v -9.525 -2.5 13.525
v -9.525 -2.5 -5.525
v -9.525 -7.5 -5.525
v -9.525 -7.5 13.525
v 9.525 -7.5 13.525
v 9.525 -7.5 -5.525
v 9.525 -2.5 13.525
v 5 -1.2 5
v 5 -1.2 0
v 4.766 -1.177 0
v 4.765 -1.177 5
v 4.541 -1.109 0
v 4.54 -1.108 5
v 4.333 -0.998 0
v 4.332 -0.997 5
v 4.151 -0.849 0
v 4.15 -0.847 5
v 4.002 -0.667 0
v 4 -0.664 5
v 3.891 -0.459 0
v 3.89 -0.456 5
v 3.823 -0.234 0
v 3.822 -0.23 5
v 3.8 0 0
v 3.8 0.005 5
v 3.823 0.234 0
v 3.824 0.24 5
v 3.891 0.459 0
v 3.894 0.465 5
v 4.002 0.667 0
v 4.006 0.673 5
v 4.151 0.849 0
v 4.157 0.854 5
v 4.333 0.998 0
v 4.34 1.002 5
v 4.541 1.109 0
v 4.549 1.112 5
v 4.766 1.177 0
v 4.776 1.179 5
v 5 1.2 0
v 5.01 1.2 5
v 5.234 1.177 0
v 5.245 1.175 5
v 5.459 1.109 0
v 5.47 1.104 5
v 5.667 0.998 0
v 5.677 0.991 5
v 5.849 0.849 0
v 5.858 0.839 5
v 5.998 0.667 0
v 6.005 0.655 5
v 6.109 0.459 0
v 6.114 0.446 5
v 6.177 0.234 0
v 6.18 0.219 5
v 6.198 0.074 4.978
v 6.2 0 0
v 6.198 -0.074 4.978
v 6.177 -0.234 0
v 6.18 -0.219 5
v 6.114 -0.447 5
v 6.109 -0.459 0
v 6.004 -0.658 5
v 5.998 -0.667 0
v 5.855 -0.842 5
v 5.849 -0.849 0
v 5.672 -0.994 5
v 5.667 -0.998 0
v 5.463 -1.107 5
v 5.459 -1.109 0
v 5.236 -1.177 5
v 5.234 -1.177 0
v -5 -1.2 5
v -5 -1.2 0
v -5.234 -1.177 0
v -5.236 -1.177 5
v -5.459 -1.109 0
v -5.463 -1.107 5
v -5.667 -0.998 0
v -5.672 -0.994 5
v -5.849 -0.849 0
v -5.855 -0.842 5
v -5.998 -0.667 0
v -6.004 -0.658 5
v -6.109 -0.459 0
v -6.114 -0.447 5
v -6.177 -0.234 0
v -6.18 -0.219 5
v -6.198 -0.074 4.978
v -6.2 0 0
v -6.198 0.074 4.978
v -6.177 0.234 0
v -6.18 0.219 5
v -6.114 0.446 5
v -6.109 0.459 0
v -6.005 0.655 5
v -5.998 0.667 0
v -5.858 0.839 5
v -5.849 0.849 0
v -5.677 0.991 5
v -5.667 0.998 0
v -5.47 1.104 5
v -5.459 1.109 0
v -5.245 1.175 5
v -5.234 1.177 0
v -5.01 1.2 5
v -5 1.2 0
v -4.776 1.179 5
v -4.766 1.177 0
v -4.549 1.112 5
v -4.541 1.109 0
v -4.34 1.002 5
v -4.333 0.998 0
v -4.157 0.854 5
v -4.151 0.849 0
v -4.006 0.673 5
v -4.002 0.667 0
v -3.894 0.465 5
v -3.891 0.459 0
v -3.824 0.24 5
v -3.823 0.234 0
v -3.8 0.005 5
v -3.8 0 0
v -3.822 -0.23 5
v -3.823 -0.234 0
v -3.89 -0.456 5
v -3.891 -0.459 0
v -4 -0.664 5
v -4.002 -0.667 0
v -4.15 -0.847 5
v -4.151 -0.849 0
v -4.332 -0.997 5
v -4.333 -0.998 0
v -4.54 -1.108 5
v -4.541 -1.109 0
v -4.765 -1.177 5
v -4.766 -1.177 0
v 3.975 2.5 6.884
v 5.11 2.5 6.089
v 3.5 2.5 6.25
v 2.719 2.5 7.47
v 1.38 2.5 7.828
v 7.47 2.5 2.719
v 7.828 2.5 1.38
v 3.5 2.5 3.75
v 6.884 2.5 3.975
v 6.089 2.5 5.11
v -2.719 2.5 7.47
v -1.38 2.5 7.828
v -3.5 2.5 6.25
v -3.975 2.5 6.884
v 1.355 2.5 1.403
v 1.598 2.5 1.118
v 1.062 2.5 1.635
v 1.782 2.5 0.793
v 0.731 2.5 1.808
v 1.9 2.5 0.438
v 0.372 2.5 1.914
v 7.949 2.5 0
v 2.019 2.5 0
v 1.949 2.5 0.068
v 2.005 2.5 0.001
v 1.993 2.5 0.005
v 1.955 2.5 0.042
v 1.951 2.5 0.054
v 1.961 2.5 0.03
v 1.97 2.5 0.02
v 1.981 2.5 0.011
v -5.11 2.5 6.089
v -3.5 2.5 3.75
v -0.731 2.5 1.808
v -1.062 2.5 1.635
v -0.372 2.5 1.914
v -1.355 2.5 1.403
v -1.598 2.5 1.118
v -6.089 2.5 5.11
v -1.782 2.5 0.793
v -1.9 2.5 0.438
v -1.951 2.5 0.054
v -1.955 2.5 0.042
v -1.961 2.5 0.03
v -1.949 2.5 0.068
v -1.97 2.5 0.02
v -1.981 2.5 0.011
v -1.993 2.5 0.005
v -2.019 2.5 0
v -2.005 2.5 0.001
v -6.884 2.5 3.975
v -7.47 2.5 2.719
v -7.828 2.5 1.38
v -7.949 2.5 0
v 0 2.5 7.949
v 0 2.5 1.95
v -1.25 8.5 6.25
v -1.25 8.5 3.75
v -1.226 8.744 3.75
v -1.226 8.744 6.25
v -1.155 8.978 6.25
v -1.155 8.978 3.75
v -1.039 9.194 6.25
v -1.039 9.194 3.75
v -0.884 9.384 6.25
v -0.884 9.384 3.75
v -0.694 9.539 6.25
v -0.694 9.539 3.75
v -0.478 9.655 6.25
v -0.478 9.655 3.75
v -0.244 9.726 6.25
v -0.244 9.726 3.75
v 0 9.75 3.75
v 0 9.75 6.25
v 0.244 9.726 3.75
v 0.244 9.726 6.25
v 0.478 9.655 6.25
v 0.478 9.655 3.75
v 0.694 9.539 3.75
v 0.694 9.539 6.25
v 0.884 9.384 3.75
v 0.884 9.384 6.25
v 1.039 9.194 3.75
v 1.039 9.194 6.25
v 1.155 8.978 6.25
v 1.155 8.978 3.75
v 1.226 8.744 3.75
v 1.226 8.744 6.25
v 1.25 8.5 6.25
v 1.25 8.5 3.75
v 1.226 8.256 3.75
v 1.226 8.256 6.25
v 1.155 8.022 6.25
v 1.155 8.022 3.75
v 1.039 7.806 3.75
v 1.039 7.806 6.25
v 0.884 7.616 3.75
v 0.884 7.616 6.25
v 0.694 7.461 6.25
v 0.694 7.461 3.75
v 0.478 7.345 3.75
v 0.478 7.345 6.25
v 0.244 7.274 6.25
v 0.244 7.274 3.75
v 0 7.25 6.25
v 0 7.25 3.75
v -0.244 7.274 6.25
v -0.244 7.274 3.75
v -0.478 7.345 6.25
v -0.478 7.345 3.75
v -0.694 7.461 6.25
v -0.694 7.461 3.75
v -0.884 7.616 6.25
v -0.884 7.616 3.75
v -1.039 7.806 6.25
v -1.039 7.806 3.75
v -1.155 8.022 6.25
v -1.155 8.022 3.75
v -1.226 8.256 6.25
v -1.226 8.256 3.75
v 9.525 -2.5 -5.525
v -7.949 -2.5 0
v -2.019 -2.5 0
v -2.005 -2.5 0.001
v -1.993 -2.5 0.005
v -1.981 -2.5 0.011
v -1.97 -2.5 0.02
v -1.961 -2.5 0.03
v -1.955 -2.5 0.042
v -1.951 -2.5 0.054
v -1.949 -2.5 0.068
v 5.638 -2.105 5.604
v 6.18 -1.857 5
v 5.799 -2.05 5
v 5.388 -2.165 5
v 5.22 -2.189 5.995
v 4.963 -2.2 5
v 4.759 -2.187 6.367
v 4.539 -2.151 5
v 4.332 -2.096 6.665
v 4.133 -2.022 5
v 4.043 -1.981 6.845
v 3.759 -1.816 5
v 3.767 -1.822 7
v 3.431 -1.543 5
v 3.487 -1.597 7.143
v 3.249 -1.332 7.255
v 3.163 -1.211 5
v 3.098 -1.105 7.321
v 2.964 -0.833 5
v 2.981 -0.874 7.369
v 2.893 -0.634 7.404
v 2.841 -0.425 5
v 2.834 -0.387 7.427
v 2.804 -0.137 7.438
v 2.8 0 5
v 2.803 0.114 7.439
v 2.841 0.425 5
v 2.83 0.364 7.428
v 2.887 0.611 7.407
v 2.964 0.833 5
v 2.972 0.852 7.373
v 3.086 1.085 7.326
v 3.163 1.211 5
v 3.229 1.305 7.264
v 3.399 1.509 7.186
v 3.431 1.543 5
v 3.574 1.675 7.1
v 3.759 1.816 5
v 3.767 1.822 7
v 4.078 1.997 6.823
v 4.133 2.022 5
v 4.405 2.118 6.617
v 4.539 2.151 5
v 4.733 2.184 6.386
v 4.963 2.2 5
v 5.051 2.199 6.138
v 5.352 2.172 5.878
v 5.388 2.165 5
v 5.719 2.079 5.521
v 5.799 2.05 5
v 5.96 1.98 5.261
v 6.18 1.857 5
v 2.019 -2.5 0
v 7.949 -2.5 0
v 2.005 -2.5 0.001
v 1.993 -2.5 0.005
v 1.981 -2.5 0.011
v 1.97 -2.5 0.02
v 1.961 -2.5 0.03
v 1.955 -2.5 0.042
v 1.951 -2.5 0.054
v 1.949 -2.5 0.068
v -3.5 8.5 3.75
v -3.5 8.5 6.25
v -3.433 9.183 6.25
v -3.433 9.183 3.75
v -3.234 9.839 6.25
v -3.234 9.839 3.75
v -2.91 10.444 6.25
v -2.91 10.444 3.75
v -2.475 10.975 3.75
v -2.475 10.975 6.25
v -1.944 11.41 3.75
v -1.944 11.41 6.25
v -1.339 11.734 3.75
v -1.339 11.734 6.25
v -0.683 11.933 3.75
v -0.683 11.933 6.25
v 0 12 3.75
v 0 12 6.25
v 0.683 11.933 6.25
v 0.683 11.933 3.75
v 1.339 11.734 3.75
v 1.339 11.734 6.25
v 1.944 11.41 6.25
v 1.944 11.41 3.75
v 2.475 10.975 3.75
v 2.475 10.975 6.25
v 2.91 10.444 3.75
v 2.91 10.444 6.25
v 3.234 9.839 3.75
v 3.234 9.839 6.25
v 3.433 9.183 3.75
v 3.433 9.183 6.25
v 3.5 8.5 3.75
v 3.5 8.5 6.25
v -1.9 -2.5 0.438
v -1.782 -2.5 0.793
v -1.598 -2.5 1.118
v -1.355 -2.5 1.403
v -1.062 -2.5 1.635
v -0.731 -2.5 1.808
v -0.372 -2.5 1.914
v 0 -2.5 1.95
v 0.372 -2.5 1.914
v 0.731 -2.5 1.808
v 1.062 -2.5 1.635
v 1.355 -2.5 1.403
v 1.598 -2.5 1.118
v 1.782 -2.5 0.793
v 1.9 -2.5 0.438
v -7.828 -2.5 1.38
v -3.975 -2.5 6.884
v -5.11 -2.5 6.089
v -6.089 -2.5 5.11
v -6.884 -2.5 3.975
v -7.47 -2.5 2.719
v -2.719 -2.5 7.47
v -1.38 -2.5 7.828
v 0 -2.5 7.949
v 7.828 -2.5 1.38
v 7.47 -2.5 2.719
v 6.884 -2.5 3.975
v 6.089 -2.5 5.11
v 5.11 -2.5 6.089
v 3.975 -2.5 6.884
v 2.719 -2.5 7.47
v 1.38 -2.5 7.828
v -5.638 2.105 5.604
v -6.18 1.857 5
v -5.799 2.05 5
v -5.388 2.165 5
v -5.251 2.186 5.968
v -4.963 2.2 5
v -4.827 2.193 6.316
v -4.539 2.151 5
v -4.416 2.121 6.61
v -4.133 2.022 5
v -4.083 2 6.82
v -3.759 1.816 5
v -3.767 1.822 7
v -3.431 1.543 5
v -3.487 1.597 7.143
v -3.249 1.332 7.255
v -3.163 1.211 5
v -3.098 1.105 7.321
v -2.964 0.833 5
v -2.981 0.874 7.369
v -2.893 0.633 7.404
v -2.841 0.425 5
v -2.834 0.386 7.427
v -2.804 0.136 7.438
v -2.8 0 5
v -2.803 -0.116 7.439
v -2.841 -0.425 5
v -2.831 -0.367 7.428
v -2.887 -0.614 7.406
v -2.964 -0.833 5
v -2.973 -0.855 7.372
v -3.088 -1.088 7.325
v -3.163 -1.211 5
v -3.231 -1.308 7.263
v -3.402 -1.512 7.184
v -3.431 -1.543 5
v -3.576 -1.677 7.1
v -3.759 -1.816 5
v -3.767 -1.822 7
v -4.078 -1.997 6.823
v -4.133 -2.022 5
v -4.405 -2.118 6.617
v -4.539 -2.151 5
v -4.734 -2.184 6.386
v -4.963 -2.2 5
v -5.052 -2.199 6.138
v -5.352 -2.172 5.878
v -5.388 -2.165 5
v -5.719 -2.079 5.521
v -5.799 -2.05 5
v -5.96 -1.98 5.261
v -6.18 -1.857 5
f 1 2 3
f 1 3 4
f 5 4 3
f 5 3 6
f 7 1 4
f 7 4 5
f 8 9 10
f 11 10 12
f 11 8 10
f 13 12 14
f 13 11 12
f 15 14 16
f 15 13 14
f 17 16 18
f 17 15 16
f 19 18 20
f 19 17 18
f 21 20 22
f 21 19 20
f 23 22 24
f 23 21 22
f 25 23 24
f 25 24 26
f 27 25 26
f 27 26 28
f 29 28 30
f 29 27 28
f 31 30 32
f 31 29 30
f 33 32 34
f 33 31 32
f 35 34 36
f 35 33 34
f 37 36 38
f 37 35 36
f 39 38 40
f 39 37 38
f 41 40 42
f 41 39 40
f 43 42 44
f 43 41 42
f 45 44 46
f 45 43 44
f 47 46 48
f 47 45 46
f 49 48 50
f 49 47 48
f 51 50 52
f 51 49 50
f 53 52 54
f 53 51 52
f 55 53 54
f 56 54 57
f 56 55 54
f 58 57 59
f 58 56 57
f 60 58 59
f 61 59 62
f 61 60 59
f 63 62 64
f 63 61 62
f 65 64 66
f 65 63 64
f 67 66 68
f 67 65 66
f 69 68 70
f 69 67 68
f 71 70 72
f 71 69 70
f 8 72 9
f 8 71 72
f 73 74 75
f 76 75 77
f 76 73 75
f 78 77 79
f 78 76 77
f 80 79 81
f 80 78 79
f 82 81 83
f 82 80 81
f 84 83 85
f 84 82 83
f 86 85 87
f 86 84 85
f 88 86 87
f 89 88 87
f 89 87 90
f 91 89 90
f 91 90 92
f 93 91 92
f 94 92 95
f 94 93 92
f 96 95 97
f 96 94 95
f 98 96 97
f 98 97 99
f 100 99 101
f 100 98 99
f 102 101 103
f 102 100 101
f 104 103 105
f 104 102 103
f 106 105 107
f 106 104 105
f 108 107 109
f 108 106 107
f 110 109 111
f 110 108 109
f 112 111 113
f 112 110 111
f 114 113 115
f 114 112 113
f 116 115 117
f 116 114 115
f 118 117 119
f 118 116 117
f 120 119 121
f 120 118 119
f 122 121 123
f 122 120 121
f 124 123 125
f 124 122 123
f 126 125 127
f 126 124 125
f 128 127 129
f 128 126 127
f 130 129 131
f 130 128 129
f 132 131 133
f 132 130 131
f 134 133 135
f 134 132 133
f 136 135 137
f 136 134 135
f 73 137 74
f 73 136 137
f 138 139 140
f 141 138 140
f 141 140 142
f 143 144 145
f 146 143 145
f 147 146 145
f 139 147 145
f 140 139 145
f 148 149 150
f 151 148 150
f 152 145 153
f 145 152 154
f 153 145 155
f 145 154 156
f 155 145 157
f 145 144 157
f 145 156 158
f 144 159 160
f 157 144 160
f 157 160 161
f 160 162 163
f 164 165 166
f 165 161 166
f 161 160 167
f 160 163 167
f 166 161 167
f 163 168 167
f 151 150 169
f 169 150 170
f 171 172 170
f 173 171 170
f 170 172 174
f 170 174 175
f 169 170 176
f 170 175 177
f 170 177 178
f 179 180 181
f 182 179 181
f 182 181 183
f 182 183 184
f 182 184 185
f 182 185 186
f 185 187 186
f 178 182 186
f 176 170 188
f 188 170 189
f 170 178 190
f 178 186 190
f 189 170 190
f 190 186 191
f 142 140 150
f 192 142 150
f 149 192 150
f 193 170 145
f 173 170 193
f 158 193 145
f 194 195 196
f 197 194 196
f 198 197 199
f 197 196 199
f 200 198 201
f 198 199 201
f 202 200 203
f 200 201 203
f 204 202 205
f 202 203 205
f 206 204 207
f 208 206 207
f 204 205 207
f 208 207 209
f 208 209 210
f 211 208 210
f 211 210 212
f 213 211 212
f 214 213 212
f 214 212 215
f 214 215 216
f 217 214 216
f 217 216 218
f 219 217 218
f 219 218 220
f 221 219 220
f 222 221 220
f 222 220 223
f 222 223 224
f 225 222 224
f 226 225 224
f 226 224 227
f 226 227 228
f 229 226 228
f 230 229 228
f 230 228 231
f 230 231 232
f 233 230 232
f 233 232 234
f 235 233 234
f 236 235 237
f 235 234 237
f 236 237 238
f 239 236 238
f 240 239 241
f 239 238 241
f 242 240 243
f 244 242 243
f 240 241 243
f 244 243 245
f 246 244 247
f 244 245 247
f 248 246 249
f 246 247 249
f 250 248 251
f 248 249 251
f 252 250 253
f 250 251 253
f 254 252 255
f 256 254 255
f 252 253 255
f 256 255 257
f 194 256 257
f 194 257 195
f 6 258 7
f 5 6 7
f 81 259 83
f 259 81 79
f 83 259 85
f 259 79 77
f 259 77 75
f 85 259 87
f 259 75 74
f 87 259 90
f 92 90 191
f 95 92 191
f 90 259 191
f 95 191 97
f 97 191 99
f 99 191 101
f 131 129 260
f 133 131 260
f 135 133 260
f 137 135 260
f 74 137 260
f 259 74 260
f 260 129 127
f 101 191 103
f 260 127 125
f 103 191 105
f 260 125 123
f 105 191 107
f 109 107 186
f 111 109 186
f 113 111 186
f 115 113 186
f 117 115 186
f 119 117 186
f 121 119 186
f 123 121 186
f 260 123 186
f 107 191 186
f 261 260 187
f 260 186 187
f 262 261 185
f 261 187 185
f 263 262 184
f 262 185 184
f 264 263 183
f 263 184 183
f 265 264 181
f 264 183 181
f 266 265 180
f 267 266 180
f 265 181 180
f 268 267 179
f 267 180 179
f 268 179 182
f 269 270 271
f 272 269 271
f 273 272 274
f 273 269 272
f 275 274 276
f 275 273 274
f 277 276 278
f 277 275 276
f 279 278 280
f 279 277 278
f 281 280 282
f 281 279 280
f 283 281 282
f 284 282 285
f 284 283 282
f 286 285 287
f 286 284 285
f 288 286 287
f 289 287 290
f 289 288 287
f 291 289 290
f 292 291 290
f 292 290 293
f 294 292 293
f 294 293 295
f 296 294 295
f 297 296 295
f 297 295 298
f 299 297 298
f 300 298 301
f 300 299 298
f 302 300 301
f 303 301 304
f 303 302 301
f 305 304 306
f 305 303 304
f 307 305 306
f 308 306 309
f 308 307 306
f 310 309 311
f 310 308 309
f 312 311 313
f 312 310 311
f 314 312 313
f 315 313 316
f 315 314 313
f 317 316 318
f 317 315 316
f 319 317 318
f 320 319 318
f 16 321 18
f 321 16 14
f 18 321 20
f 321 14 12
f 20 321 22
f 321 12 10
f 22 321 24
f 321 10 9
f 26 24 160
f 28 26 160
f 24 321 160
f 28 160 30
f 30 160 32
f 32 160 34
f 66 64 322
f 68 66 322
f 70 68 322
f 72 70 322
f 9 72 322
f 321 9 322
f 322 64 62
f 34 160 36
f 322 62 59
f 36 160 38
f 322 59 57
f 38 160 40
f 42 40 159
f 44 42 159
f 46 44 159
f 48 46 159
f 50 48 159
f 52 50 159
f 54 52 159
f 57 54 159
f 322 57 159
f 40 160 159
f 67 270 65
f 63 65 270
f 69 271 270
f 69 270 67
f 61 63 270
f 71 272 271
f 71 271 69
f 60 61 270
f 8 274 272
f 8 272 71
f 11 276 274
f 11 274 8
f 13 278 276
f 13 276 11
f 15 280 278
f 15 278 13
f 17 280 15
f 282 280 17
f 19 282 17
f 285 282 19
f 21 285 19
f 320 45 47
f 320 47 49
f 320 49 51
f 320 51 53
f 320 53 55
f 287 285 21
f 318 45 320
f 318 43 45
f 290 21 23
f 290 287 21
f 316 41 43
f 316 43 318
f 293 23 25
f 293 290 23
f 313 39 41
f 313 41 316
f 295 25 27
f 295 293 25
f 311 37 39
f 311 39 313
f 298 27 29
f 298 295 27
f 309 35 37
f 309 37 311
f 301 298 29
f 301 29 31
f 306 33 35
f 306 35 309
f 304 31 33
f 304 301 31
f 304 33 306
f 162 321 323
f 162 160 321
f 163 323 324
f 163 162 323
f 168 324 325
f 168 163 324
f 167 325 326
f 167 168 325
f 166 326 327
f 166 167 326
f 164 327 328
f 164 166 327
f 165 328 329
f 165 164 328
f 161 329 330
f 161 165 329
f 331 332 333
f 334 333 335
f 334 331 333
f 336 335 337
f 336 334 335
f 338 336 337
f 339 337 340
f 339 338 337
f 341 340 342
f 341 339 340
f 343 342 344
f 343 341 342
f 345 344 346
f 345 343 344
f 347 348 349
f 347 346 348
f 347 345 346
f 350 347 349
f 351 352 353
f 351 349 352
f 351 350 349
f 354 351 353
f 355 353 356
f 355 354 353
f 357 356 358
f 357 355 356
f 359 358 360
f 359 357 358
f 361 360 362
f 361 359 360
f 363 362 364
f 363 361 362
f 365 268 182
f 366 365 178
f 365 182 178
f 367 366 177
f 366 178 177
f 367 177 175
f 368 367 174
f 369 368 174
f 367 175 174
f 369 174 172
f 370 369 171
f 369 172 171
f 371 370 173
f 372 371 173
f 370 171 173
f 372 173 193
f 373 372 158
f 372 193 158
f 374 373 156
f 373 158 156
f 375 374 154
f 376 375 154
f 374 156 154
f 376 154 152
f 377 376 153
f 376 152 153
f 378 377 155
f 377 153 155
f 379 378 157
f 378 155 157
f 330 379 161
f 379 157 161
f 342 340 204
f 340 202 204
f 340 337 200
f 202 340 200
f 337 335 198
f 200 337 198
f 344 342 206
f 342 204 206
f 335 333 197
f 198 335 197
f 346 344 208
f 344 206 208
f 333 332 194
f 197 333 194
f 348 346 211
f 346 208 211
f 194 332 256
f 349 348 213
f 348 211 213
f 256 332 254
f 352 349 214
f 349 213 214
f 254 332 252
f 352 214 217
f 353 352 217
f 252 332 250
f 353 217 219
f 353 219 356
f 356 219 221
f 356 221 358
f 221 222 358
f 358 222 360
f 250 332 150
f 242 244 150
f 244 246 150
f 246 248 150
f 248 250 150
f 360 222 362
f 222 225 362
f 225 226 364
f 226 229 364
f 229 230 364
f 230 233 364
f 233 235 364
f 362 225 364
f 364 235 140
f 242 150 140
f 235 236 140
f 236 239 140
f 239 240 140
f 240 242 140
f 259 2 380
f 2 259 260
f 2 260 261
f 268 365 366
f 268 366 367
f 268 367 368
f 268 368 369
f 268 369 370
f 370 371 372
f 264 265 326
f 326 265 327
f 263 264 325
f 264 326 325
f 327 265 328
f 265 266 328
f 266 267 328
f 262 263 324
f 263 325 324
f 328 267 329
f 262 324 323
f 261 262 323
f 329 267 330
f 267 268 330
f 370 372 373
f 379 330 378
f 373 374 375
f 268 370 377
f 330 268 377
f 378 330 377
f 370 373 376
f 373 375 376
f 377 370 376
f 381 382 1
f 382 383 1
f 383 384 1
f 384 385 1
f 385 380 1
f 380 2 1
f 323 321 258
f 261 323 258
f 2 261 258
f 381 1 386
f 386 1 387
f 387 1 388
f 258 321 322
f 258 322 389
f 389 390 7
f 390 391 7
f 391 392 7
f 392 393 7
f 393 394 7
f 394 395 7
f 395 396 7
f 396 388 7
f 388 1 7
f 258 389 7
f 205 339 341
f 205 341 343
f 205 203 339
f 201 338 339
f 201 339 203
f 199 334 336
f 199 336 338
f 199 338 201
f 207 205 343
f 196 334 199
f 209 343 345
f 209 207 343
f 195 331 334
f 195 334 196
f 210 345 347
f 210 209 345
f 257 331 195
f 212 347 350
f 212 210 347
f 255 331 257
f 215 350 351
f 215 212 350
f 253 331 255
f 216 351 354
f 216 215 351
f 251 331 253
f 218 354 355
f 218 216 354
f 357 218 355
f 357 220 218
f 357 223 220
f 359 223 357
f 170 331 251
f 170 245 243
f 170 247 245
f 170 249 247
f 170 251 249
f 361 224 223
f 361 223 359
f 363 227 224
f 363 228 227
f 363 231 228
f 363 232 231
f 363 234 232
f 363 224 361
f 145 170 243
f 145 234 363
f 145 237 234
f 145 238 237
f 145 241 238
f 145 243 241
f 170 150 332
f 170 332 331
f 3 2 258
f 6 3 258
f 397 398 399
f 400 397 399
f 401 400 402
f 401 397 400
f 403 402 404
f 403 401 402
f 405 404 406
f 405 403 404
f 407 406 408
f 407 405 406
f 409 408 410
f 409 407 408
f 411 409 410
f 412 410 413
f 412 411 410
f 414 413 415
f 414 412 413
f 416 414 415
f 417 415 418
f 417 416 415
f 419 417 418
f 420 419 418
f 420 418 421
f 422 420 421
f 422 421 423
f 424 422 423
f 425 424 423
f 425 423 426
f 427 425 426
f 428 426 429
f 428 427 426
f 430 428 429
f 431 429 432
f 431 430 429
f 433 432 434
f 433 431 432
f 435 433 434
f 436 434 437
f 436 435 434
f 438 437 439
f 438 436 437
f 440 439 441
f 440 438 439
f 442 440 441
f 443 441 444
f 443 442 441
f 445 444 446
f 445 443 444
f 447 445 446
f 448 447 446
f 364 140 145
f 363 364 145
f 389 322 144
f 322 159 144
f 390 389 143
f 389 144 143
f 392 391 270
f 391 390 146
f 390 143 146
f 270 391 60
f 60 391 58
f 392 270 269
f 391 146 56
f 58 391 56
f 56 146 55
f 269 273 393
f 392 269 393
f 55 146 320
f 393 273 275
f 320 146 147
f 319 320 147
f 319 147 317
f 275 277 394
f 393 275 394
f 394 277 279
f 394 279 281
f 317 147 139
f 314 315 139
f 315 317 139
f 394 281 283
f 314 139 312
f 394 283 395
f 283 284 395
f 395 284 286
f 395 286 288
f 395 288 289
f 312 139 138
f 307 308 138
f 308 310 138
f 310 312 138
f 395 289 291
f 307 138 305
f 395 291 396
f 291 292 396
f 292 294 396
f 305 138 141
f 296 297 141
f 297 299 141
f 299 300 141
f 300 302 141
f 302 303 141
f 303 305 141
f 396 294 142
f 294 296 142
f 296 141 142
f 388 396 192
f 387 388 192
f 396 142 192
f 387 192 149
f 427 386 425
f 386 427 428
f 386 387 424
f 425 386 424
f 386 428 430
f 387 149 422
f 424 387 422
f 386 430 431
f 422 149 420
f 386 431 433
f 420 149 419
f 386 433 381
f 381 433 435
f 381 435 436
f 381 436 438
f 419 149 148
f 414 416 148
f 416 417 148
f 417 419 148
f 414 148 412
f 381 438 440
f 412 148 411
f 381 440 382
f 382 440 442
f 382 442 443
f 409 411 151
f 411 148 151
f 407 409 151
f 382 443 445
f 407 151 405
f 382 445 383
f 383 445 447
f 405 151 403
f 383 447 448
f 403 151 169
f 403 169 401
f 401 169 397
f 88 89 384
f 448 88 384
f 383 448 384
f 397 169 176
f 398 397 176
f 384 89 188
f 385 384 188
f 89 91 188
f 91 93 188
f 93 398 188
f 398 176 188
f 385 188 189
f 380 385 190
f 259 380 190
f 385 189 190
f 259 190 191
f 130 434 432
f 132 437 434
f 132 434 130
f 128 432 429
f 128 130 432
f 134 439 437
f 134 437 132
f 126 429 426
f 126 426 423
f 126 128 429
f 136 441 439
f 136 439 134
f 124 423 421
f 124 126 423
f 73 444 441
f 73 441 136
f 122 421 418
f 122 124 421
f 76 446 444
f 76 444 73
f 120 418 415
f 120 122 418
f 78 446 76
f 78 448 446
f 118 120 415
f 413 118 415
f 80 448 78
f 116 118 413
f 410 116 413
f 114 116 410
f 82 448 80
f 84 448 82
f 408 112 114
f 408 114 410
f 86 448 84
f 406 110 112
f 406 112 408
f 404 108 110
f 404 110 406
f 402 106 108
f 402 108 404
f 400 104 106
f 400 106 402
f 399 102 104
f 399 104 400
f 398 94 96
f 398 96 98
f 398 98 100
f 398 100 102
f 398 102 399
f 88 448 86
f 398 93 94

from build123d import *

# Parameters (mm, degrees)
BOSS_EXTRUDE1_DEPTH           = 2.5
SKETCH2_W                     = 7
SKETCH2_H                     = 2.5
BOSS_EXTRUDE2_DEPTH           = 9.5
CUT_EXTRUDE1_DEPTH            = 9.5
SKETCH4_R                     = 1.25
CUT_EXTRUDE2_DEPTH            = 9.5
CBORE_FOR_M2_SHCS1_AT_2_COUNT = 2
CBORE_FOR_M2_SHCS1_AT_2_PITCH = 10
SKETCH8_R                     = 2.2
CUT_EXTRUDE3_DEPTH            = 9.5
SKETCH11_W                    = 19.05
SKETCH11_H                    = 19.05
BOSS_EXTRUDE3_DEPTH           = 5
FILLET1_R                     = 0.07


with BuildPart() as part:
    # Sketch1 → Boss-Extrude1 (new body, symmetric)
    with BuildSketch(Plane(origin=(0, 0, 0), x_dir=(1, 0, 0), z_dir=(0, 1, 0))):
        with BuildLine():
            Line((1.95, 0), (7.9492, 0))
            ThreePointArc((7.9492, 0), (0, -7.9492), (-7.9492, 0))
            Line((-7.9492, 0), (-1.95, 0))
            ThreePointArc((-1.95, 0), (0, -1.95), (1.95, 0))
        make_face()
    extrude(amount=BOSS_EXTRUDE1_DEPTH, both=True)

    # Sketch2 → Boss-Extrude2 (add)
    with BuildSketch(Plane(origin=(0, 2.5, 0), x_dir=(1, 0, 0), z_dir=(0, 1, 0))):
        with Locations((0, -5)):
            Rectangle(SKETCH2_W, SKETCH2_H)
    extrude(amount=BOSS_EXTRUDE2_DEPTH)

    # Sketch3 → Cut-Extrude1 (cut)
    with BuildSketch(Plane(origin=(0, 0, 3.75), x_dir=(-1, 0, 0), z_dir=(0, 0, -1))):
        with BuildLine():
            Line((-3.5, 8.5), (-3.5, 14.886359519))
            Line((-3.5, 14.886359519), (0, 16.809201746))
            Line((0, 16.809201746), (3.5, 14.5))
            Line((3.5, 14.5), (3.5, 8.5))
            ThreePointArc((3.5, 8.5), (0, 12), (-3.5, 8.5))
        make_face()
    extrude(amount=-CUT_EXTRUDE1_DEPTH, mode=Mode.SUBTRACT)

    # Sketch4 → Cut-Extrude2 (cut)
    with BuildSketch(Plane(origin=(0, 0, 3.75), x_dir=(-1, 0, 0), z_dir=(0, 0, -1))):
        with Locations((0, 8.5)):
            Circle(SKETCH4_R)
    extrude(amount=-CUT_EXTRUDE2_DEPTH, mode=Mode.SUBTRACT)

    # Sketch7 → CBORE for M2 SHCS1 (revolve, cut)
    with BuildSketch(Plane(origin=(5, 0, 7), x_dir=(0, -1, 0), z_dir=(1, 0, 0))):
        Polygon((0, 0), (0, 7), (1.2, 7), (1.2, 2), (2.2, 2), (2.2, 0), align=None)
    cbore_for_m2_shcs1 = revolve(axis=Axis((5, 0, 13.35), (0, 0, -1)), mode=Mode.SUBTRACT)

    # CBORE for M2 SHCS1 at 2: CBORE for M2 SHCS1 ×2
    with Locations(*[(-i * CBORE_FOR_M2_SHCS1_AT_2_PITCH, 0, 0) for i in range(1, CBORE_FOR_M2_SHCS1_AT_2_COUNT)]):
        add(cbore_for_m2_shcs1, mode=Mode.SUBTRACT)

    # Sketch8 → Cut-Extrude3 (cut)
    with BuildSketch(Plane(origin=(0, 0, 7), x_dir=(-1, 0, 0), z_dir=(0, 0, -1))):
        with Locations((-5, 0)):
            Circle(SKETCH8_R)
        with Locations((5, 0)):
            Circle(SKETCH8_R)
    extrude(amount=-CUT_EXTRUDE3_DEPTH, mode=Mode.SUBTRACT)

    # Sketch11 → Boss-Extrude3 (add)
    with BuildSketch(Plane.XZ.offset(2.5)):
        with Locations((0, 4)):
            Rectangle(SKETCH11_W, SKETCH11_H)
    extrude(amount=BOSS_EXTRUDE3_DEPTH)

    # Fillet1
    fillet1_edges = [part.edges().sort_by_distance(p)[0] for p in [
        (1.95, 0, 0),
        (-1.95, 0, 0),
    ]]
    fillet(fillet1_edges, radius=FILLET1_R)


solid = part.part
